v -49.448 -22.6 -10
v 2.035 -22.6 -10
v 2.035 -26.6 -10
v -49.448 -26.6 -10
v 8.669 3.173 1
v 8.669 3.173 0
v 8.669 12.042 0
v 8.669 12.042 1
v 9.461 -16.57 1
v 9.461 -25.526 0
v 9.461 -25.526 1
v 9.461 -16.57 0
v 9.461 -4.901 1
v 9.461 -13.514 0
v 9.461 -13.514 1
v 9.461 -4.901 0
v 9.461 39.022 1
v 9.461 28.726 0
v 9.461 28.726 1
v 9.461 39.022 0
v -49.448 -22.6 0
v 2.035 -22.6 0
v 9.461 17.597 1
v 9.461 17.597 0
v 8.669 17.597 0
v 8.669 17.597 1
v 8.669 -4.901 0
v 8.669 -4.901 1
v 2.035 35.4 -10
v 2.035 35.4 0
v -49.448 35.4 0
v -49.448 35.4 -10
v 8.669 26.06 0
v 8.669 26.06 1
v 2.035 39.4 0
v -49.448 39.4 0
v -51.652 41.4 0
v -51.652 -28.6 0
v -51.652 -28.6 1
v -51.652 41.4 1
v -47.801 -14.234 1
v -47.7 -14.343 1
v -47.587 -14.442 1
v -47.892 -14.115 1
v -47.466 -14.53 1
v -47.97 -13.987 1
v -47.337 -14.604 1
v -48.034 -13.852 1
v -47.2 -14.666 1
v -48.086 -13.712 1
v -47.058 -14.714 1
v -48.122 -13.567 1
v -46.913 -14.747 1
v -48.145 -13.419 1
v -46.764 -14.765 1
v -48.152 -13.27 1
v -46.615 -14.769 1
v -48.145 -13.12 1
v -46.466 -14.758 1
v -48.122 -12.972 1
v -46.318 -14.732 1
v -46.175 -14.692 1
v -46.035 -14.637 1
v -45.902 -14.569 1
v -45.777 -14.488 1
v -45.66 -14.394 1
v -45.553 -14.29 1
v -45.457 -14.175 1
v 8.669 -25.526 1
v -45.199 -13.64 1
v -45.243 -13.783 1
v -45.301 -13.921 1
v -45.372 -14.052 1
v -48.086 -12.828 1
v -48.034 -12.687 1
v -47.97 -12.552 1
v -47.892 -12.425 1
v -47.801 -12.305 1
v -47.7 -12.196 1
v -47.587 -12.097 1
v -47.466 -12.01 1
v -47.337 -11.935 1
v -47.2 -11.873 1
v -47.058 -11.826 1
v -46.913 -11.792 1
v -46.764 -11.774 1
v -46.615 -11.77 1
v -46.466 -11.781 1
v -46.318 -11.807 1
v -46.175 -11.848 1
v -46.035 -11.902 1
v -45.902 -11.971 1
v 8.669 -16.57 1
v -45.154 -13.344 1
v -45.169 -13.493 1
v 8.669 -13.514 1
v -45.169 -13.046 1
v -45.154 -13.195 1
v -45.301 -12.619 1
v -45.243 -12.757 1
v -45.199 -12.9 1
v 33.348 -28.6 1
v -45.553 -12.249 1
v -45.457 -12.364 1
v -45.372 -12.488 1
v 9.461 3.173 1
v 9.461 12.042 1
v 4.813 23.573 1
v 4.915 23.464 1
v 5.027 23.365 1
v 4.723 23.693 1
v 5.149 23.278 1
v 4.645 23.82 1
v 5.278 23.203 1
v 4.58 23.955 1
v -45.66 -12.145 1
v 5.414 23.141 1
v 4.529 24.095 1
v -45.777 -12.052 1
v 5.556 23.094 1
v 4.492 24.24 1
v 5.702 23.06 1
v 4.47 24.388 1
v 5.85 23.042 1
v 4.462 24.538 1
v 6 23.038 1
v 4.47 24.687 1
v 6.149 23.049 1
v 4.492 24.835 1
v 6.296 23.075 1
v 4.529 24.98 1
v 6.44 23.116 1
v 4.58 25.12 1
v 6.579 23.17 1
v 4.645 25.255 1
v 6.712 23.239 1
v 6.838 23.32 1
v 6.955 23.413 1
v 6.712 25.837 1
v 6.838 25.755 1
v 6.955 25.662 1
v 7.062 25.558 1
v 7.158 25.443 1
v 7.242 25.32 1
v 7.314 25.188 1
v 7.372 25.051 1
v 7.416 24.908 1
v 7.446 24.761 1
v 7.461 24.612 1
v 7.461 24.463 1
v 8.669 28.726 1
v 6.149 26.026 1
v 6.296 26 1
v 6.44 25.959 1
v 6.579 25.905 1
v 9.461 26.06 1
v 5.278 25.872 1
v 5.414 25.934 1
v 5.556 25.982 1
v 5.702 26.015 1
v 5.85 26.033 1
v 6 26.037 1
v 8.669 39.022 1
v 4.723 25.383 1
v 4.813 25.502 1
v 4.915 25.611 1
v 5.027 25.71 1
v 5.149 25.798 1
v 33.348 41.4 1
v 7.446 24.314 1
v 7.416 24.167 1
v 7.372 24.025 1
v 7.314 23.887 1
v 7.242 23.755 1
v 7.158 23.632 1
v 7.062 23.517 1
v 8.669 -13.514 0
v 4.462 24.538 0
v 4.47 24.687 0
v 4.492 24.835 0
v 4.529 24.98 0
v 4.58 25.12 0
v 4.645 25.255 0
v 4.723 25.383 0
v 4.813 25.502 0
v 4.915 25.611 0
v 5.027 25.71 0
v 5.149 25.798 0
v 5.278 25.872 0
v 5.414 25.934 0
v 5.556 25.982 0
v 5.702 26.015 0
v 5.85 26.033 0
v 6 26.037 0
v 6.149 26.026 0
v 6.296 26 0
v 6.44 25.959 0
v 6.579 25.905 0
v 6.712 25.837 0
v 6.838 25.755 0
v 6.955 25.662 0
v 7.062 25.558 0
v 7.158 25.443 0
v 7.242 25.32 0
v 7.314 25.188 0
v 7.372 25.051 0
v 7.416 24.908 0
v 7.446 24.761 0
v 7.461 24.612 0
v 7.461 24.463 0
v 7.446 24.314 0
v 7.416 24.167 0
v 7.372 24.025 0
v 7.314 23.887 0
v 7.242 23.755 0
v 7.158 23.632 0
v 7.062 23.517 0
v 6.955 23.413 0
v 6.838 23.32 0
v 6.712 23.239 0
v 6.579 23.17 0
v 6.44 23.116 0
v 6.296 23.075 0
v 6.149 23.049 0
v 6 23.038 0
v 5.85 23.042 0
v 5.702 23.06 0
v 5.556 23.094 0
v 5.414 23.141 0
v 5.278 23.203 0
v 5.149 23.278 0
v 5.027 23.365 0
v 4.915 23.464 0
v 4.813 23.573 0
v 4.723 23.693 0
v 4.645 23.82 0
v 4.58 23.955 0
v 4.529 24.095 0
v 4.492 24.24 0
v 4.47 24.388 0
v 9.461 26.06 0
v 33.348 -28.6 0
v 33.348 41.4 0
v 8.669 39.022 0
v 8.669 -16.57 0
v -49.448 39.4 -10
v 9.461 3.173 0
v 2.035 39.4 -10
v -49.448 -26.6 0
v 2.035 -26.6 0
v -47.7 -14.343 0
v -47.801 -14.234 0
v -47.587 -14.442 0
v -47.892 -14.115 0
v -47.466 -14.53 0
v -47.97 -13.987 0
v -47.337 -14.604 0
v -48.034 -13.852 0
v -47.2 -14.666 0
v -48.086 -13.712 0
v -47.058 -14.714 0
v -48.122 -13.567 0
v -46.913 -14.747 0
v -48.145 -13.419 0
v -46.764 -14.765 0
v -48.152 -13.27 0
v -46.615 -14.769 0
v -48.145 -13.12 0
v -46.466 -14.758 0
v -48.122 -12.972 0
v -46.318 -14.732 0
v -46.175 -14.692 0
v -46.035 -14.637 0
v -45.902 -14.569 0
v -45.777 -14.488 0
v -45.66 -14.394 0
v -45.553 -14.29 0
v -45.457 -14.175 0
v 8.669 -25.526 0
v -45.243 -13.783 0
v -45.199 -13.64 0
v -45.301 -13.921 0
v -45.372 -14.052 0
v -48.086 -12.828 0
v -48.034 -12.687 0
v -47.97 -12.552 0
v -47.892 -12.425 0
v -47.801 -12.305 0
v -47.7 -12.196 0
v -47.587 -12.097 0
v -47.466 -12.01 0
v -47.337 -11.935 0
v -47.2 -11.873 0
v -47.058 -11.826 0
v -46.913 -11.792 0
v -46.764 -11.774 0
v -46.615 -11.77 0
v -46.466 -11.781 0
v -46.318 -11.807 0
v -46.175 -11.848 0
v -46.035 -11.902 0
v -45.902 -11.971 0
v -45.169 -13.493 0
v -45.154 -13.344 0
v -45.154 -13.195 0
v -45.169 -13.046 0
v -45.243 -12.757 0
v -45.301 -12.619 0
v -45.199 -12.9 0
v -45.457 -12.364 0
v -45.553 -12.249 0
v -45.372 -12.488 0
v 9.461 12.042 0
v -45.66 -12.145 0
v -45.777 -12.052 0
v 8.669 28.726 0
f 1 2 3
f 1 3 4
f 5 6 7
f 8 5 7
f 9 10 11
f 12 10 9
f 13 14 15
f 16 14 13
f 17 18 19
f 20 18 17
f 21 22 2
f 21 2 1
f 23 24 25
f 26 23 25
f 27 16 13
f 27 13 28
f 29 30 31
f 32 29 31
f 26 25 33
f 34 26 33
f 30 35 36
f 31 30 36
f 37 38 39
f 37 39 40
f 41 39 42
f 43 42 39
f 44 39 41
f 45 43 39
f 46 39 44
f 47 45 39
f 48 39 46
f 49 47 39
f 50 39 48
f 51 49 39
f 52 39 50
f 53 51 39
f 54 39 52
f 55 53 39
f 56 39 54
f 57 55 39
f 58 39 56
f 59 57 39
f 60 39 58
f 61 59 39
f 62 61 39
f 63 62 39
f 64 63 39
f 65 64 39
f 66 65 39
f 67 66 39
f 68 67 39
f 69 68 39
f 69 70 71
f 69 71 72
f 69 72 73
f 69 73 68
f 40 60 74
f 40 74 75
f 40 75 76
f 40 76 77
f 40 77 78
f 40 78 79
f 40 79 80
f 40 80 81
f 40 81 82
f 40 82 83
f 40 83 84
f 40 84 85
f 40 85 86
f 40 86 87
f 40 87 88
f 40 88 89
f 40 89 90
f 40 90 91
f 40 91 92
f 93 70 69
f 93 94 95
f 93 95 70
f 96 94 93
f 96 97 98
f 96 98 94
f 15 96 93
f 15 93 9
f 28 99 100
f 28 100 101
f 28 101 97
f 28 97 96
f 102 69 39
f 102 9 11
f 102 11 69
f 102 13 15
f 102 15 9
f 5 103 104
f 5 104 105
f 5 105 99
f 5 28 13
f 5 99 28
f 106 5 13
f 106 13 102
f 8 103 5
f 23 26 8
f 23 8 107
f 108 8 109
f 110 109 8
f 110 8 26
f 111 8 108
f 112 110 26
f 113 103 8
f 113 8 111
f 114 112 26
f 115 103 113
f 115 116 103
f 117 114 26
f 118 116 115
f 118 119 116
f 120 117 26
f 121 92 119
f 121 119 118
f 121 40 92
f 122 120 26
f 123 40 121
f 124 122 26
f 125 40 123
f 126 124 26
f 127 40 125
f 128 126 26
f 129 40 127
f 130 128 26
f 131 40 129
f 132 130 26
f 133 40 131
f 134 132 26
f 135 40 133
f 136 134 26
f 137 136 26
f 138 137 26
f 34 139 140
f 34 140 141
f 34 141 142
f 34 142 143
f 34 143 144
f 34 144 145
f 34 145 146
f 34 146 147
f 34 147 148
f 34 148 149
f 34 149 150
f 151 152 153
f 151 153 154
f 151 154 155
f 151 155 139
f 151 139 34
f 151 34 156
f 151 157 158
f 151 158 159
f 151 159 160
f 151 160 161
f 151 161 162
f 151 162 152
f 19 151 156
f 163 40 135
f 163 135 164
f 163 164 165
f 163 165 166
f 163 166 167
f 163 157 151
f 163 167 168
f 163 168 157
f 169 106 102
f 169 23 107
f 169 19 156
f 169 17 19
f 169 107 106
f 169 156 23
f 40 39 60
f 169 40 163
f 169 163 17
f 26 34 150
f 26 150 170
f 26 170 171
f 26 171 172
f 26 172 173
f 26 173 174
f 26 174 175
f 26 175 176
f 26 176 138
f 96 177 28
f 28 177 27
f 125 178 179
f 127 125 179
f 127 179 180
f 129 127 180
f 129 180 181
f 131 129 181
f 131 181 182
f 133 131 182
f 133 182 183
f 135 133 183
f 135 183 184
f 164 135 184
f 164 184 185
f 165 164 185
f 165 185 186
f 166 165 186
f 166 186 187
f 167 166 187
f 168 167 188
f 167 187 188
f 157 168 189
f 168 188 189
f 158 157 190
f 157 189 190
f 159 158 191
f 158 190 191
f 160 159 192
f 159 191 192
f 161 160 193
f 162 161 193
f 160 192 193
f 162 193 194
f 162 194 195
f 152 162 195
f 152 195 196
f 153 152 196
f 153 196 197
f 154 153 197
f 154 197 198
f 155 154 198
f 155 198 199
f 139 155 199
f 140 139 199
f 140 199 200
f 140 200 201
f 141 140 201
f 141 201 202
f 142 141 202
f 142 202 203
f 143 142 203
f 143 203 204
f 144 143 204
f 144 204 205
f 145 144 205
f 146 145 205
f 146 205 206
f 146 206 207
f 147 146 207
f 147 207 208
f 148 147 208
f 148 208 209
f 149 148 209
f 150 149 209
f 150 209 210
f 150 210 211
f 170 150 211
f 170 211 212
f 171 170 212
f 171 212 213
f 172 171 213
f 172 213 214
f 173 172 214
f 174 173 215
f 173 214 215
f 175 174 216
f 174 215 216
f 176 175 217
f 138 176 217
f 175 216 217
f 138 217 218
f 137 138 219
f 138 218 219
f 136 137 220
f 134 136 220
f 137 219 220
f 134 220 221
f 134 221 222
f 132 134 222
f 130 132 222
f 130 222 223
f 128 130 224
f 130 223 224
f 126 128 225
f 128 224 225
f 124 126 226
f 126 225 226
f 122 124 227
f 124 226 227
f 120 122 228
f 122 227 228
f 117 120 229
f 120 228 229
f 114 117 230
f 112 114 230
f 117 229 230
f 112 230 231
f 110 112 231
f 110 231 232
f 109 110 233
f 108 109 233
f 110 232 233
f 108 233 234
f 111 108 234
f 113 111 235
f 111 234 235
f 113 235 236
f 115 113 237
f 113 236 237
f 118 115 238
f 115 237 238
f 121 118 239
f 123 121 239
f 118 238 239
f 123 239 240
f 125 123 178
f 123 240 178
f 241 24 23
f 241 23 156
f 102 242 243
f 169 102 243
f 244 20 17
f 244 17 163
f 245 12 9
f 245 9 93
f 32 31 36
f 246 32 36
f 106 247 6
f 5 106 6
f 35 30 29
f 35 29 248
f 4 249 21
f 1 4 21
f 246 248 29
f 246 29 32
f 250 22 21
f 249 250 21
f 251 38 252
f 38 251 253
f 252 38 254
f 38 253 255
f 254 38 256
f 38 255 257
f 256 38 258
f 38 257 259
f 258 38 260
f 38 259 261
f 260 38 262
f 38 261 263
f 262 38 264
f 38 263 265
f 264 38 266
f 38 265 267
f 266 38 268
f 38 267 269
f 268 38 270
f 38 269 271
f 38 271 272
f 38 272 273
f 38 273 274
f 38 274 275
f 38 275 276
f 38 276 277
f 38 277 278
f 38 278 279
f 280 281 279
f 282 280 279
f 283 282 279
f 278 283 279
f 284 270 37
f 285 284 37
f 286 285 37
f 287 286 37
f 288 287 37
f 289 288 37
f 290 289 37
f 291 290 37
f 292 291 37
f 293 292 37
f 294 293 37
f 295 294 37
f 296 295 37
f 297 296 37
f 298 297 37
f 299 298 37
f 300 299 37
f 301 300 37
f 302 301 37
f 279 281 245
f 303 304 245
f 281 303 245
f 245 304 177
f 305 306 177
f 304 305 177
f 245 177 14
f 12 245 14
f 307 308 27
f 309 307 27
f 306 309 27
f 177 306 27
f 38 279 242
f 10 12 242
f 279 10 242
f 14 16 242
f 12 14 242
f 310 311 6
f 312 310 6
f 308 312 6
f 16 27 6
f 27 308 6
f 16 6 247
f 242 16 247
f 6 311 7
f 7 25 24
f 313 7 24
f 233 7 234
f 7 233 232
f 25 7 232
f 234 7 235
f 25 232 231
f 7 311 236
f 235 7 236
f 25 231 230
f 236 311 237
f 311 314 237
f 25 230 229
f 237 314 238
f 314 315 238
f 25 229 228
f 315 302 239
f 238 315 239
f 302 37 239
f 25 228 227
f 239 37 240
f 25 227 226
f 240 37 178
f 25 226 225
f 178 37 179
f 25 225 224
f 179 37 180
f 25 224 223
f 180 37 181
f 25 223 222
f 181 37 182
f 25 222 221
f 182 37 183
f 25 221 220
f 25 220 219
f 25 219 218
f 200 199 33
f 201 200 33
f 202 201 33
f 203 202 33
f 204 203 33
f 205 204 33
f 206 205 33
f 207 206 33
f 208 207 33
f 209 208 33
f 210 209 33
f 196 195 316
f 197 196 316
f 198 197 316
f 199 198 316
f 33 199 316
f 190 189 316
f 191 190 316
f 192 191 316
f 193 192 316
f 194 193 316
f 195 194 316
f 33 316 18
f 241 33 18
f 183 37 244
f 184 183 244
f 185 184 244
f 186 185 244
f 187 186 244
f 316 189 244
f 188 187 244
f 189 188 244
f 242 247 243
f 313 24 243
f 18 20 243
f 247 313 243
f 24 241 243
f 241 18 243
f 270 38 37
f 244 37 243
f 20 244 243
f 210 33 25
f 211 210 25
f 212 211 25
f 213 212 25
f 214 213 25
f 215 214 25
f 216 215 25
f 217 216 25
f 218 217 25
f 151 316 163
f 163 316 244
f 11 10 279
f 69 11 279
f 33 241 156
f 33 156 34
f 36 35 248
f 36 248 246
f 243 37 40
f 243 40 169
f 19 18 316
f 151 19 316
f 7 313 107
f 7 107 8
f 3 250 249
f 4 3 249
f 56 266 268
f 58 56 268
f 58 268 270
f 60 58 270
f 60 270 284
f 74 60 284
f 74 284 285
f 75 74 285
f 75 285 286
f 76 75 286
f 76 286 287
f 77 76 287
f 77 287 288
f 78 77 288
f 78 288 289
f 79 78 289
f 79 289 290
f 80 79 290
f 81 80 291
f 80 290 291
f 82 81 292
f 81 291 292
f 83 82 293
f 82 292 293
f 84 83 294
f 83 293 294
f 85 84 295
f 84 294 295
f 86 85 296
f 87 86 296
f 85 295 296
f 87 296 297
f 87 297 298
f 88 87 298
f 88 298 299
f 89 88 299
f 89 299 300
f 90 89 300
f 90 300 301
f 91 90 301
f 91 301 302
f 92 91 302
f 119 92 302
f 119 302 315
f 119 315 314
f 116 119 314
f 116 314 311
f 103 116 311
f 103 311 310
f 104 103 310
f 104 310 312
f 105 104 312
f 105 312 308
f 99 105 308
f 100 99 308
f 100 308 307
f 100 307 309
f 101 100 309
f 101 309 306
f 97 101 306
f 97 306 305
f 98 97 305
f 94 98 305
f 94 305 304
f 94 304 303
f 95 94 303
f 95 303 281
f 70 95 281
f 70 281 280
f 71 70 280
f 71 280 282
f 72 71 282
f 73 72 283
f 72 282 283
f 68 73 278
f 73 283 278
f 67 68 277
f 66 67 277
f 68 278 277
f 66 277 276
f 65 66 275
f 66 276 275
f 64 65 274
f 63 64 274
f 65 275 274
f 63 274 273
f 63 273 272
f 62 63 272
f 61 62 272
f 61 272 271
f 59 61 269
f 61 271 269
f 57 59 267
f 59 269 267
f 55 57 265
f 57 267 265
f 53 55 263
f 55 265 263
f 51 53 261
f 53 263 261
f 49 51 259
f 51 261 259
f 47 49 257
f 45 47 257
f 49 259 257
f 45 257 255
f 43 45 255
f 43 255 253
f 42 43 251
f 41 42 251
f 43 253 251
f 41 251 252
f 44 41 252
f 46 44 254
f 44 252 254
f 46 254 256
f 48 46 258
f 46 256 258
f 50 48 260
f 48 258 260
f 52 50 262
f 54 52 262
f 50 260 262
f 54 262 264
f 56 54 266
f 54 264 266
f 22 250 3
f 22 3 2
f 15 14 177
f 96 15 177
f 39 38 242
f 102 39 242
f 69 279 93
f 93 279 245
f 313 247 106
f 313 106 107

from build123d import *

# Parameters (mm, degrees)
SKETCH1_W             = 85
SKETCH1_H             = 70
BOSS_EXTRUDE1_DEPTH   = 1
SKETCH2_W             = 51.483328029
SKETCH2_H             = 4
BOSS_EXTRUDE2_DEPTH   = 10
BOSS_EXTRUDE2_2_DEPTH = 10
SKETCH3_W             = 0.7920512
SKETCH3_H             = 10.296665606
SKETCH3_H_2           = 8.462788072
SKETCH3_H_3           = 8.869103227
SKETCH3_H_4           = 8.612860113
SKETCH3_H_5           = 8.955645719
CUT_EXTRUDE1_DEPTH    = 10
SKETCH4_R             = 1.5
CUT_EXTRUDE3_DEPTH    = 33


with BuildPart() as part:
    # Sketch1 → Boss-Extrude1 (new body)
    with BuildSketch(Plane.XY):
        with Locations((-9.152236253, 6.399676375)):
            Rectangle(SKETCH1_W, SKETCH1_H)
    extrude(amount=BOSS_EXTRUDE1_DEPTH)

    # Sketch3 → Cut-Extrude1 (cut)
    with BuildSketch(Plane(origin=(0, 0, 0), x_dir=(-1, 0, 0), z_dir=(0, 0, -1))):
        with Locations((-9.064941357, 33.873952391)):
            Rectangle(SKETCH3_W, SKETCH3_H)
        with Locations((-9.064941357, 21.82838749)):
            Rectangle(SKETCH3_W, SKETCH3_H_2)
        with Locations((-9.064941357, 7.607144744)):
            Rectangle(SKETCH3_W, SKETCH3_H_3)
        with Locations((-9.064941357, -9.207607822)):
            Rectangle(SKETCH3_W, SKETCH3_H_4)
        with Locations((-9.064941357, -21.04821127)):
            Rectangle(SKETCH3_W, SKETCH3_H_5)
    extrude(amount=-CUT_EXTRUDE1_DEPTH, mode=Mode.SUBTRACT)

    # Sketch4 → Cut-Extrude3 (cut)
    with BuildSketch(Plane(origin=(0, 0, -10), x_dir=(-1, 0, 0), z_dir=(0, 0, -1))):
        with Locations((46.652236253, -13.269677869)):
            Circle(SKETCH4_R)
        with Locations((-5.962384938, 24.537566162)):
            Circle(SKETCH4_R)
    extrude(amount=-CUT_EXTRUDE3_DEPTH, mode=Mode.SUBTRACT)


with BuildPart() as body_2:
    # Sketch2 → Boss-Extrude2 (new body)
    with BuildSketch(Plane(origin=(0, 0, 0), x_dir=(-1, 0, 0), z_dir=(0, 0, -1))):
        with Locations((23.706177062, 37.399676375)):
            Rectangle(SKETCH2_W, SKETCH2_H)
    extrude(amount=BOSS_EXTRUDE2_DEPTH)


with BuildPart() as body_3:
    # Sketch2 → Boss-Extrude2 2 (new body)
    with BuildSketch(Plane(origin=(0, 0, 0), x_dir=(-1, 0, 0), z_dir=(0, 0, -1))):
        with Locations((23.706177062, -24.600323625)):
            Rectangle(SKETCH2_W, SKETCH2_H)
    extrude(amount=BOSS_EXTRUDE2_2_DEPTH)


solid = Compound([part.part, body_2.part, body_3.part])
